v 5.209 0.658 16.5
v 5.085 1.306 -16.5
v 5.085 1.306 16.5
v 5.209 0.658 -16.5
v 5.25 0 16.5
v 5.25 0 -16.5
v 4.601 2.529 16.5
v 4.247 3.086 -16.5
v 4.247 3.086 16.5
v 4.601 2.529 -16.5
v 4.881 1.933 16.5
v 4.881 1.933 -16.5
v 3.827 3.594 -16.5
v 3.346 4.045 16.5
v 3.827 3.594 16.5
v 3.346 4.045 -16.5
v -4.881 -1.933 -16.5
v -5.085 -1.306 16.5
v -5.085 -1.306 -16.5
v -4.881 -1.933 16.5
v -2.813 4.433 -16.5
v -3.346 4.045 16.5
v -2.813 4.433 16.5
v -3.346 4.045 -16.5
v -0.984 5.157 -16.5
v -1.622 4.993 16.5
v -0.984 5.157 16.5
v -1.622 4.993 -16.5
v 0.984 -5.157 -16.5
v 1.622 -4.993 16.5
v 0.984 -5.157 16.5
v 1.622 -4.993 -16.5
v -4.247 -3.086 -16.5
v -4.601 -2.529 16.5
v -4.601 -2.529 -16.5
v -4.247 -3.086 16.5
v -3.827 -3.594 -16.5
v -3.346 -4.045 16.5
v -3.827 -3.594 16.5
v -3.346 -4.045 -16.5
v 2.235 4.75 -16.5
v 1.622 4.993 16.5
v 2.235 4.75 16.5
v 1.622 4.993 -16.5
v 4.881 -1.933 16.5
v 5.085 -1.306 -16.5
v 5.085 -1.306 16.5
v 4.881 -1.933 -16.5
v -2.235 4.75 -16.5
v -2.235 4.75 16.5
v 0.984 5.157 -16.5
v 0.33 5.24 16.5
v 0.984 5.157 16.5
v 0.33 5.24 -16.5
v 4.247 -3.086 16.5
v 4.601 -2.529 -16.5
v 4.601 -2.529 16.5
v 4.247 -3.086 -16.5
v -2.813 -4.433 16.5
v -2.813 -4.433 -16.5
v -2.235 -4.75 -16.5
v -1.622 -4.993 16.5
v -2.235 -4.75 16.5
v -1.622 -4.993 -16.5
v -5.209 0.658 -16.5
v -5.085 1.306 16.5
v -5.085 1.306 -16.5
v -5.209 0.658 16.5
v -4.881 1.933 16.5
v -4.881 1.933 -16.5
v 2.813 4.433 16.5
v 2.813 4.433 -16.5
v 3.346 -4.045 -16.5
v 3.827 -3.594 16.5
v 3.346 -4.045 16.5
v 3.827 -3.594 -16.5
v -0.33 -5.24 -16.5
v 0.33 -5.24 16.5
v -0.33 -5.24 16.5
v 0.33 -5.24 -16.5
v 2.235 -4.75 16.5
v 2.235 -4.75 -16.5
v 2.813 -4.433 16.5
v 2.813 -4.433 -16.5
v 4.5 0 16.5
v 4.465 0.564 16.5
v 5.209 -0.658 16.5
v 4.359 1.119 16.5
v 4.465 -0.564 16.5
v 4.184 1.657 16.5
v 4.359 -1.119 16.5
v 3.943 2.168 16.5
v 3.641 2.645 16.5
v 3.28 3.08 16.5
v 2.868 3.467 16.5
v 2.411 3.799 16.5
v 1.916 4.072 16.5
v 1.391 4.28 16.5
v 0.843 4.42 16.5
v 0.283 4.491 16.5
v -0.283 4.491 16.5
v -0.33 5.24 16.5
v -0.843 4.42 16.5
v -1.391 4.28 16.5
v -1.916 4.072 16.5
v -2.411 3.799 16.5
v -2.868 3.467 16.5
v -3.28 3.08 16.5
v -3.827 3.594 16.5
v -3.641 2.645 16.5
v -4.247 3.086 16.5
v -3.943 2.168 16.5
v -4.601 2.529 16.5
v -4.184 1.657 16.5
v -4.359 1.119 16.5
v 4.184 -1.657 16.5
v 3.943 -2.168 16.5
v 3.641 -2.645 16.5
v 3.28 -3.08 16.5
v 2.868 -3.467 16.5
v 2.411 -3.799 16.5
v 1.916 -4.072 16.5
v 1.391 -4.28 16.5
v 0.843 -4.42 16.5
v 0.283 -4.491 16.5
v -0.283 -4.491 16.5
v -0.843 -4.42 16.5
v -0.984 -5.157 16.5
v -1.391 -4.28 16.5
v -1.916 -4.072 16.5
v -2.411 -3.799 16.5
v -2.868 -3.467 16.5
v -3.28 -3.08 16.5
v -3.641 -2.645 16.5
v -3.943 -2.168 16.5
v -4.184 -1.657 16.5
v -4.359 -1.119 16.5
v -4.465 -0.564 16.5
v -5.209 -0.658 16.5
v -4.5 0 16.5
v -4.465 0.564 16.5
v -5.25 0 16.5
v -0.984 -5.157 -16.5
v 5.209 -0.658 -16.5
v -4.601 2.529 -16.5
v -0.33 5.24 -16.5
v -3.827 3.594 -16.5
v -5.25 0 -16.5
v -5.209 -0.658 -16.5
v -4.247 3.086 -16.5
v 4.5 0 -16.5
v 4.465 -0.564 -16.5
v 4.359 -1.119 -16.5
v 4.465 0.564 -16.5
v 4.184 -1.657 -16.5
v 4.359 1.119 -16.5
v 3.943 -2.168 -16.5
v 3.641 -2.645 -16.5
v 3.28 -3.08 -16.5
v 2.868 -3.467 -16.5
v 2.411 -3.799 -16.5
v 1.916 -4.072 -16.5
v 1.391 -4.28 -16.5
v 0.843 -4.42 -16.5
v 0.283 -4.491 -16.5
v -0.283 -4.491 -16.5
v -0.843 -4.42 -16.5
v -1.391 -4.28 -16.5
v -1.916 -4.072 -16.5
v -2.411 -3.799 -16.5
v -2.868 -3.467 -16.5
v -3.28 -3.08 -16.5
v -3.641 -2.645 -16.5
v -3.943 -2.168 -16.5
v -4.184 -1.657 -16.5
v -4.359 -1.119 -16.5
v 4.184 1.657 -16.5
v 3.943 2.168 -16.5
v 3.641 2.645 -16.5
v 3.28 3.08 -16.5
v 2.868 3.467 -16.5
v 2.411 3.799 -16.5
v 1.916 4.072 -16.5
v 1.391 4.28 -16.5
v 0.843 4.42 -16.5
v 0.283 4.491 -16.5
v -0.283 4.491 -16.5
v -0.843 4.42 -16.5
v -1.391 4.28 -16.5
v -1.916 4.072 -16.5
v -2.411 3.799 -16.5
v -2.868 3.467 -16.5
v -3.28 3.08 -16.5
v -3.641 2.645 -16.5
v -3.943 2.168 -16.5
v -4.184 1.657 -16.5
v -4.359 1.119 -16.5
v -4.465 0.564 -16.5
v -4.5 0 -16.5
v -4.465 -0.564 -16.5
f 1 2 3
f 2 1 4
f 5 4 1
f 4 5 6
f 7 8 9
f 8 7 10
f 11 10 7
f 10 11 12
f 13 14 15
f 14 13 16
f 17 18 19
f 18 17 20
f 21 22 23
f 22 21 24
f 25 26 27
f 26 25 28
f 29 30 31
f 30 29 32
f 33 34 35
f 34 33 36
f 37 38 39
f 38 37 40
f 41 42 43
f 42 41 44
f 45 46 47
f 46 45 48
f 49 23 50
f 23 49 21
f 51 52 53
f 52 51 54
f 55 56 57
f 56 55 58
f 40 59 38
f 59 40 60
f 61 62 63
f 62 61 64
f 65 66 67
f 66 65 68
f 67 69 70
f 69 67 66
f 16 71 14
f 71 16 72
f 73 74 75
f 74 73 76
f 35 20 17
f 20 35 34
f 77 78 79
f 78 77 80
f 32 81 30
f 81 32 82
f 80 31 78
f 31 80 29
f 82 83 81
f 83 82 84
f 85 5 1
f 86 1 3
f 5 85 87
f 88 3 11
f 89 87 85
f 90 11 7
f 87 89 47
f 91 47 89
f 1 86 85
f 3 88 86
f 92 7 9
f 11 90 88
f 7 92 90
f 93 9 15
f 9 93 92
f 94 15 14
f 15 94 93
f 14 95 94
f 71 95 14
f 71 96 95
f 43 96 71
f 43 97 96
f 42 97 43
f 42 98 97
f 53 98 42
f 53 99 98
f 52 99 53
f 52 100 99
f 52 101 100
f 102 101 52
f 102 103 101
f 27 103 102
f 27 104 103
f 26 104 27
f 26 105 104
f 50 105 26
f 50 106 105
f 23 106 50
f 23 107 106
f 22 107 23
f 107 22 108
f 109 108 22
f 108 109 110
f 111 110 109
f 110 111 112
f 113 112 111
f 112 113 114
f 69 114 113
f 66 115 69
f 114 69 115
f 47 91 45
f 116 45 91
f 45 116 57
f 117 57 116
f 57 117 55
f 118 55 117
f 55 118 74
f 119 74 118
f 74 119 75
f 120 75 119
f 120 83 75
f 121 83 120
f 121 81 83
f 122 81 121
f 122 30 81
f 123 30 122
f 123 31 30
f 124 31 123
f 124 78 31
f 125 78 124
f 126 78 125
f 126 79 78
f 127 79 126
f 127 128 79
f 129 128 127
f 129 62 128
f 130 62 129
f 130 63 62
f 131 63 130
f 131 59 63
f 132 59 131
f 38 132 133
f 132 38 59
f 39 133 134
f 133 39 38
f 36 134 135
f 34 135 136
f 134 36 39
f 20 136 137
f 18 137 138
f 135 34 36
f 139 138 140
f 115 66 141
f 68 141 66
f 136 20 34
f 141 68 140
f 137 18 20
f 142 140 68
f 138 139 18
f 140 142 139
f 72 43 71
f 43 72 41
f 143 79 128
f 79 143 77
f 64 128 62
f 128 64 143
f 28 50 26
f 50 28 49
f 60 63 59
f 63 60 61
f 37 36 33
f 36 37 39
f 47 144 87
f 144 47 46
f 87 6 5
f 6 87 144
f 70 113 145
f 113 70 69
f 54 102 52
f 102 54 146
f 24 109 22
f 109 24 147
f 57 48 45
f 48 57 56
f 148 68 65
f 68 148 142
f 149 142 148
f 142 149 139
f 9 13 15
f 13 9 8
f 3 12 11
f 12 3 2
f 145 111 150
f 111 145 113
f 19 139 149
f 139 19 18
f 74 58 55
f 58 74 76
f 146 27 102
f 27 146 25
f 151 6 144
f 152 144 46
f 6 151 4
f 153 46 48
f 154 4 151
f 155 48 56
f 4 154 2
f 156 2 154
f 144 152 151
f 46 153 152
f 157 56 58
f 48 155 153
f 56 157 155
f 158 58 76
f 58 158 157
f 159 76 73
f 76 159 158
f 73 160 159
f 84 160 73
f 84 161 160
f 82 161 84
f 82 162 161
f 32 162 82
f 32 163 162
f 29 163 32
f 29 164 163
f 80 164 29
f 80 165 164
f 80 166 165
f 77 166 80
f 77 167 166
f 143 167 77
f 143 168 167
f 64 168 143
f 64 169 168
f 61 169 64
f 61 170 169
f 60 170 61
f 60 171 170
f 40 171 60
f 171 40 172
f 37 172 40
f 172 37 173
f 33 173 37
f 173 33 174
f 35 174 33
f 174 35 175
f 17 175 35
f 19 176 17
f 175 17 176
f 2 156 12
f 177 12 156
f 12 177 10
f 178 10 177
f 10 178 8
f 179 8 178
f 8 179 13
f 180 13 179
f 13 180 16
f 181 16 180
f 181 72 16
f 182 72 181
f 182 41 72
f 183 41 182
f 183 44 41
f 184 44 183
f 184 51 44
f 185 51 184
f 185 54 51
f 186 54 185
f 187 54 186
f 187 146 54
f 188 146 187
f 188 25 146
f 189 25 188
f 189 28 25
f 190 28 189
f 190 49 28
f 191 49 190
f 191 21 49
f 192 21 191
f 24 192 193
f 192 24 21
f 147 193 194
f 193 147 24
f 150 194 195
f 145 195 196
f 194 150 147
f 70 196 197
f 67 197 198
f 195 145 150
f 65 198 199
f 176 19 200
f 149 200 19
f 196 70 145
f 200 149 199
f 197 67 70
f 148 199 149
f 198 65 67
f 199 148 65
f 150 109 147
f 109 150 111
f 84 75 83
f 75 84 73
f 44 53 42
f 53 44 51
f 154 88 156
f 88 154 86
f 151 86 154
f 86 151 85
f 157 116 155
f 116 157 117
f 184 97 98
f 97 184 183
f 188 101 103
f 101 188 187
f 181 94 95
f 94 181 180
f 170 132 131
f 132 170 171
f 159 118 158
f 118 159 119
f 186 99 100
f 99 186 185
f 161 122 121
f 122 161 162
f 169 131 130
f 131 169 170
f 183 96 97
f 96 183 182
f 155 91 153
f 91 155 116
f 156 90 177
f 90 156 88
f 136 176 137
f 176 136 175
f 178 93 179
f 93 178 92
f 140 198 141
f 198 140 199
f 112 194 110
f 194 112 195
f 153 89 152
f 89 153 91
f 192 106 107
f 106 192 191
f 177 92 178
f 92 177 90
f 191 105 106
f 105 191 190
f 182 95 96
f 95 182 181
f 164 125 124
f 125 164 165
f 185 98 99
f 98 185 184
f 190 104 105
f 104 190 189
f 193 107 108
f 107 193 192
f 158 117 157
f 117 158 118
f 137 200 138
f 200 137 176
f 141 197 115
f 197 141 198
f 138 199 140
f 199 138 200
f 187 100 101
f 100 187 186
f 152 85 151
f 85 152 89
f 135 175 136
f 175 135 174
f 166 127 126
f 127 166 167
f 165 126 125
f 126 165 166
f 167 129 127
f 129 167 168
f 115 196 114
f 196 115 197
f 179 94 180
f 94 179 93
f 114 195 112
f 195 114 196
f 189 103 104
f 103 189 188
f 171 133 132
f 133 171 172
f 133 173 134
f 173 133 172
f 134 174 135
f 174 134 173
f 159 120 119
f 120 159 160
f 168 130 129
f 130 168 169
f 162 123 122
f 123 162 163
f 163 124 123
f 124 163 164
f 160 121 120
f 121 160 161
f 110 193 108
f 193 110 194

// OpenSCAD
$fn = 50;


difference() {
	union() {
		translate(v = [0, 0, -16.5000000000]) {
			cylinder(h = 33, r = 5.2500000000);
		}
	}
	union() {
		translate(v = [0, 0, -100.0000000000]) {
			cylinder(h = 200, r = 4.5000000000);
		}
	}
}
